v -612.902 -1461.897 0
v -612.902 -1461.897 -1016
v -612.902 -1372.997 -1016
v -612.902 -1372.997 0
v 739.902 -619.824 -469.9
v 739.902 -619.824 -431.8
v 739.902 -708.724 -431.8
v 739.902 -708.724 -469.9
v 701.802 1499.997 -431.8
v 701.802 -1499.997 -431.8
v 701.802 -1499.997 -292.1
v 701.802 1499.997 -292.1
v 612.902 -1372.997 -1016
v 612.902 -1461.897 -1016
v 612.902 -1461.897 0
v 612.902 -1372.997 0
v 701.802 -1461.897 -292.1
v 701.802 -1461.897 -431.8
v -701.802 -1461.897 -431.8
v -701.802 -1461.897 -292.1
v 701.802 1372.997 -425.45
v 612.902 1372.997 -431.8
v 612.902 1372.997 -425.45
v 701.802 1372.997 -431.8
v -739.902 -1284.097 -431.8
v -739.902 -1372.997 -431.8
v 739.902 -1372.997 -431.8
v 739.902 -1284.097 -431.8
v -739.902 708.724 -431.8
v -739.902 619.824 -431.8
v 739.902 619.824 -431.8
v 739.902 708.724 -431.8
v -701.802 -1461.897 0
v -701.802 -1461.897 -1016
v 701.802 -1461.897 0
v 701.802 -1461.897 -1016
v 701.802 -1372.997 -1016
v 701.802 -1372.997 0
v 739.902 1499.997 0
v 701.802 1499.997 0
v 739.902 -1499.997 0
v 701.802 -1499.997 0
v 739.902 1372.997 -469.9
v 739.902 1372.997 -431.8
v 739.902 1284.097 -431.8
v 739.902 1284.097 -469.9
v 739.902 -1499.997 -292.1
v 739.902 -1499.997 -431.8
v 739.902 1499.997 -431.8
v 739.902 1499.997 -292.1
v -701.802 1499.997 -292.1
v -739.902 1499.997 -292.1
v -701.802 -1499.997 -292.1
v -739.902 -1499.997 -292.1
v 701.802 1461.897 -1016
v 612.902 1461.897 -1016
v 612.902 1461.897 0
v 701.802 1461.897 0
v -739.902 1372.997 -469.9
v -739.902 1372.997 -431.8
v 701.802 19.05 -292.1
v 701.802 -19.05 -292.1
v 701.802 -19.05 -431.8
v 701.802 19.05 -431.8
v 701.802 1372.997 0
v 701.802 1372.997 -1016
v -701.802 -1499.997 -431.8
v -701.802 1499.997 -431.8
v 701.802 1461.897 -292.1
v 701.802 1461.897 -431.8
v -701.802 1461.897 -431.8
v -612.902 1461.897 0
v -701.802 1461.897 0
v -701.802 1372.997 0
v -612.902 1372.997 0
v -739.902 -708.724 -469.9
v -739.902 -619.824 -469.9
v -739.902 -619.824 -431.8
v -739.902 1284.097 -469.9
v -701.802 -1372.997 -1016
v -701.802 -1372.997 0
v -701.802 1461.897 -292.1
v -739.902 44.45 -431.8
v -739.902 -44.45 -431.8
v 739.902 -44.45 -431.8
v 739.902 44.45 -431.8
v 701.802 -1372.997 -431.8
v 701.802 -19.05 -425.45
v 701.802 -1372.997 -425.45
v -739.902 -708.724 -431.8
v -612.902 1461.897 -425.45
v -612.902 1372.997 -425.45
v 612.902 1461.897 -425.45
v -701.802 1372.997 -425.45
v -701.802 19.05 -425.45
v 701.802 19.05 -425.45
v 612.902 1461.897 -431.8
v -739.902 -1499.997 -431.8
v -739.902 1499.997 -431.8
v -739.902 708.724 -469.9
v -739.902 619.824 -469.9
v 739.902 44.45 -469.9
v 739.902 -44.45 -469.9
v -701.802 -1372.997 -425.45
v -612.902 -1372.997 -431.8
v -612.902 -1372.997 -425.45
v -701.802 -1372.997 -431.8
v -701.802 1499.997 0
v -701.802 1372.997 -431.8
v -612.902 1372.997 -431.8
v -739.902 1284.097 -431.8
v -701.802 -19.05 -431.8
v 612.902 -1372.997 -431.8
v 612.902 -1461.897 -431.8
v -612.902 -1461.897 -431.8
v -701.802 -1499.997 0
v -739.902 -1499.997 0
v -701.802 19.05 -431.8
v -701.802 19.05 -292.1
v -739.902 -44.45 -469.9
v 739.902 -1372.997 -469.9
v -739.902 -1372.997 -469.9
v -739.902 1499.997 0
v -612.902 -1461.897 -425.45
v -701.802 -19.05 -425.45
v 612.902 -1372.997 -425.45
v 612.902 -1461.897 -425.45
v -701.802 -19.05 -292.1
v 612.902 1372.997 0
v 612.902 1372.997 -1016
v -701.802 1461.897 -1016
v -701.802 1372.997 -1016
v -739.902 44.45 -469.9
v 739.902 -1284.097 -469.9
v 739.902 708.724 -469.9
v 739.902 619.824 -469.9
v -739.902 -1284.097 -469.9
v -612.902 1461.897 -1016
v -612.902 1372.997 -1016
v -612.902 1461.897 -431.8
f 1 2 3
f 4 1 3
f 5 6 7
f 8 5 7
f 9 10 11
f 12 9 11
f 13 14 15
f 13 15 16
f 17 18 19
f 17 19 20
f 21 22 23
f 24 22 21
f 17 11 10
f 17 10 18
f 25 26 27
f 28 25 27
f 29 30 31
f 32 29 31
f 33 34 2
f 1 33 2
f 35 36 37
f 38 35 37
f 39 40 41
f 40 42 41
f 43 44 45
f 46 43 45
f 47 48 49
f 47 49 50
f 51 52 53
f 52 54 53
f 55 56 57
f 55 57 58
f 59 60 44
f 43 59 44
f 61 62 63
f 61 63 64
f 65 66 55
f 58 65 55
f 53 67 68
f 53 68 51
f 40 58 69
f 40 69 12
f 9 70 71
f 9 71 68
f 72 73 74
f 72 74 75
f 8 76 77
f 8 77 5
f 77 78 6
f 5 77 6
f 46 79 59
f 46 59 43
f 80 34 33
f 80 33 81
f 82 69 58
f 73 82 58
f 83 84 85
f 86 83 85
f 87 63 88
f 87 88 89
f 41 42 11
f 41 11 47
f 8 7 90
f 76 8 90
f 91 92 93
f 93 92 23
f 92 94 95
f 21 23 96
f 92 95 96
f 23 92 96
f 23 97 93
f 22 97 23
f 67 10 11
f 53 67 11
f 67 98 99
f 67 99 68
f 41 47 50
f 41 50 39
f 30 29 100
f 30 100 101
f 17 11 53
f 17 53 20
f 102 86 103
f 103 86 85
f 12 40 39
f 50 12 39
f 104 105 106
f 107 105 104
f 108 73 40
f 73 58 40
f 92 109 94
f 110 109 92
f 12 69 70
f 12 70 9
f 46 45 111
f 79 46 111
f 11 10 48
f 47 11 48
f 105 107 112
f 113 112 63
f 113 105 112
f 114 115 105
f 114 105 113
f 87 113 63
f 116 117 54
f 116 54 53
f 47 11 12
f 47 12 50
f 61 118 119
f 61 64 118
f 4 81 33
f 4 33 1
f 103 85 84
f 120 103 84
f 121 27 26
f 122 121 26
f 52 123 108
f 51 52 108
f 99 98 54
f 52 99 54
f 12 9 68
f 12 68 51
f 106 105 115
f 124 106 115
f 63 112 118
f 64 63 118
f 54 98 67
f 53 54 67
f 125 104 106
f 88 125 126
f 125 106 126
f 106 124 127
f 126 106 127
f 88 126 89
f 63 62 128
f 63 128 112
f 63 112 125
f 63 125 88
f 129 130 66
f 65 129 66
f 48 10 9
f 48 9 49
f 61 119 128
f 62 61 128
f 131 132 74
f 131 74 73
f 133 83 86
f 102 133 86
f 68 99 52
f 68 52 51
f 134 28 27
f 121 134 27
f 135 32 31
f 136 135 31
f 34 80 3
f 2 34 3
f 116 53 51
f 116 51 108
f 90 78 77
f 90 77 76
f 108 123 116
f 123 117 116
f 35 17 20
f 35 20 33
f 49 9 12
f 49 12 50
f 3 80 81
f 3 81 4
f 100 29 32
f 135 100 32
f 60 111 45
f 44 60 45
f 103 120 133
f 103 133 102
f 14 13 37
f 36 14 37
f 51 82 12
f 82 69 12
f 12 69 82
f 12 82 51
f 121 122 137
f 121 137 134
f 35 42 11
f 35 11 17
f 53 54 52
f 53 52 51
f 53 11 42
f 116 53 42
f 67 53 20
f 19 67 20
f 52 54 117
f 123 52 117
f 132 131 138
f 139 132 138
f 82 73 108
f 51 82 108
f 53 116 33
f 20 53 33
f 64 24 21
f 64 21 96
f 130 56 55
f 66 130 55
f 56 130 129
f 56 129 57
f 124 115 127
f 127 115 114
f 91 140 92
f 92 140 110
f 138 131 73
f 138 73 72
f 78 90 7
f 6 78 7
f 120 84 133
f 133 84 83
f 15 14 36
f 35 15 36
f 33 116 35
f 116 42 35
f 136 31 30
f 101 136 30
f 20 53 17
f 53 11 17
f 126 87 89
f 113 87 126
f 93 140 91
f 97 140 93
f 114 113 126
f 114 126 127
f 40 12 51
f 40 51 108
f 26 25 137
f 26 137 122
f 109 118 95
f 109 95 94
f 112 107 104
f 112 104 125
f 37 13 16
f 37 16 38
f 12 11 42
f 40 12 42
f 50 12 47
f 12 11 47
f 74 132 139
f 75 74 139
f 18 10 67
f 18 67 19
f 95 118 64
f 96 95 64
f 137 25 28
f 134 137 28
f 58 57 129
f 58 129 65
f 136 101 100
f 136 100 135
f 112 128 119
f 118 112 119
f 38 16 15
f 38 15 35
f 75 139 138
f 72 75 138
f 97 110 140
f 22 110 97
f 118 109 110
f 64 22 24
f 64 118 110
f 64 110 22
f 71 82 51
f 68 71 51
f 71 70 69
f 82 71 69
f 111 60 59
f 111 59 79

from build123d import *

# Parameters (mm, degrees)
F1_W          = 38.1
F1_H          = 292.1
F3_DEPTH      = 1499.997
F3_DEPTH_BACK = 1499.997
F1_H_2        = 139.7
F4_DEPTH      = 1499.997
F4_DEPTH_BACK = 1499.997
F5_W          = 38.1
F5_H          = 292.1
F6_DEPTH      = 701.802
F6_DEPTH_BACK = 701.802
F5_H_2        = 139.7
F7_DEPTH      = 701.802
F7_DEPTH_BACK = 701.802
F8_W          = 88.9
F8_H          = 88.9
F10_DEPTH     = 1016
F12_W         = 1225.804
F12_H         = 88.9
F12_W_2       = 1403.604
F12_H_2       = 575.3735
F12_H_3       = 25.4
F13_DEPTH     = 6.35
F12_W_3       = 38.1
F14_DEPTH     = 38.1
F12_H_4       = 38.1


with BuildPart() as f3:
    # F1 (on Front) → F3 (new body, two sides)
    with BuildSketch(Plane.XZ) as f3_sk:
        with Locations((-720.852, -146.05)):
            Rectangle(F1_W, F1_H)
    extrude(amount=F3_DEPTH)
    extrude(f3_sk.sketch, amount=-F3_DEPTH_BACK)


with BuildPart() as f3b:
    # F1 (on Front) → F3, piece 2 (new body, two sides)
    with BuildSketch(Plane.XZ) as f3_2_sk:
        with Locations((720.852, -146.05)):
            Rectangle(F1_W, F1_H)
    extrude(amount=F3_DEPTH)
    extrude(f3_2_sk.sketch, amount=-F3_DEPTH_BACK)


with BuildPart() as f4:
    # F1 (on Front) → F4 (new body, two sides)
    with BuildSketch(Plane.XZ) as f4_sk:
        with Locations((-720.852, -361.95)):
            Rectangle(F1_W, F1_H_2)
    extrude(amount=F4_DEPTH)
    extrude(f4_sk.sketch, amount=-F4_DEPTH_BACK)


with BuildPart() as f4b:
    # F1 (on Front) → F4, piece 2 (new body, two sides)
    with BuildSketch(Plane.XZ) as f4_2_sk:
        with Locations((720.852, -361.95)):
            Rectangle(F1_W, F1_H_2)
    extrude(amount=F4_DEPTH)
    extrude(f4_2_sk.sketch, amount=-F4_DEPTH_BACK)


with BuildPart() as f6:
    # F5 (on Right) → F6 (new body, two sides)
    with BuildSketch(Plane.YZ) as f6_sk:
        with Locations((1480.947, -146.05)):
            Rectangle(F5_W, F5_H)
    extrude(amount=F6_DEPTH)
    extrude(f6_sk.sketch, amount=-F6_DEPTH_BACK)


with BuildPart() as f6b:
    # F5 (on Right) → F6, piece 2 (new body, two sides)
    with BuildSketch(Plane.YZ) as f6_2_sk:
        with Locations((-1480.947, -146.05)):
            Rectangle(F5_W, F5_H)
    extrude(amount=F6_DEPTH)
    extrude(f6_2_sk.sketch, amount=-F6_DEPTH_BACK)


with BuildPart() as f7:
    # F5 (on Right) → F7 (new body, two sides)
    with BuildSketch(Plane.YZ) as f7_sk:
        with Locations((-1480.947, -361.95)):
            Rectangle(F5_W, F5_H_2)
    extrude(amount=F7_DEPTH)
    extrude(f7_sk.sketch, amount=-F7_DEPTH_BACK)


with BuildPart() as f7b:
    # F5 (on Right) → F7, piece 2 (new body, two sides)
    with BuildSketch(Plane.YZ) as f7_2_sk:
        with Locations((1480.947, -361.95)):
            Rectangle(F5_W, F5_H_2)
    extrude(amount=F7_DEPTH)
    extrude(f7_2_sk.sketch, amount=-F7_DEPTH_BACK)


with BuildPart() as f7c:
    # F5 (on Right) → F7, piece 3 (new body, two sides)
    with BuildSketch(Plane.YZ) as f7_3_sk:
        Polygon((19.05, -292.1), (0, -292.1), (-19.05, -292.1), (-19.05, -431.8), (19.05, -431.8), align=None)
    extrude(amount=F7_DEPTH)
    extrude(f7_3_sk.sketch, amount=-F7_DEPTH_BACK)


with BuildPart() as f10:
    # F8 (on Top) → F10 (new body, through all)
    with BuildSketch(Plane.XY):
        with Locations((-657.352, 1417.447)):
            Rectangle(F8_W, F8_H)
    extrude(amount=-F10_DEPTH)


with BuildPart() as f10b:
    # F8 (on Top) → F10, piece 2 (new body, through all)
    with BuildSketch(Plane.XY):
        with Locations((657.352, 1417.447)):
            Rectangle(F8_W, F8_H)
    extrude(amount=-F10_DEPTH)


with BuildPart() as f10c:
    # F8 (on Top) → F10, piece 3 (new body, through all)
    with BuildSketch(Plane.XY):
        with Locations((-657.352, -1417.447)):
            Rectangle(F8_W, F8_H)
    extrude(amount=-F10_DEPTH)


with BuildPart() as f10d:
    # F8 (on Top) → F10, piece 4 (new body, through all)
    with BuildSketch(Plane.XY):
        with Locations((657.352, -1417.447)):
            Rectangle(F8_W, F8_H)
    extrude(amount=-F10_DEPTH)


with BuildPart() as f13:
    # F12 (on offset) → F13 (new body)
    with BuildSketch(Plane(origin=(0, 0, -431.8), x_dir=(1, 0, 0), z_dir=(0, 0, -1))):
        with Locations((0, 1417.447)):
            Rectangle(F12_W, F12_H)
        Polygon((612.902, 1372.997), (-612.902, 1372.997), (-701.802, 1372.997), (-701.802, 1284.097), (701.802, 1284.097), (701.802, 1372.997), align=None)
        with Locations((0, 996.41025)):
            Rectangle(F12_W_2, F12_H_2)
        with Locations((0, 664.2735)):
            Rectangle(F12_W_2, F12_H)
        with Locations((0, 332.13675)):
            Rectangle(F12_W_2, F12_H_2)
        with Locations((0, 31.75)):
            Rectangle(F12_W_2, F12_H_3)
    extrude(amount=-F13_DEPTH)


with BuildPart() as f13b:
    # F12 (on offset) → F13, piece 2 (new body)
    with BuildSketch(Plane(origin=(0, 0, -431.8), x_dir=(1, 0, 0), z_dir=(0, 0, -1))):
        with Locations((0, -1417.447)):
            Rectangle(F12_W, F12_H)
        with Locations((0, -332.13675)):
            Rectangle(F12_W_2, F12_H_2)
        Polygon((701.802, -1284.097), (-701.802, -1284.097), (-701.802, -1372.997), (-612.902, -1372.997), (612.902, -1372.997), (701.802, -1372.997), align=None)
        with Locations((0, -664.2735)):
            Rectangle(F12_W_2, F12_H)
        with Locations((0, -996.41025)):
            Rectangle(F12_W_2, F12_H_2)
        with Locations((0, -31.75)):
            Rectangle(F12_W_2, F12_H_3)
    extrude(amount=-F13_DEPTH)


with BuildPart() as f14:
    # F12 (on offset) → F14 (new body)
    with BuildSketch(Plane(origin=(0, 0, -431.8), x_dir=(1, 0, 0), z_dir=(0, 0, -1))):
        with Locations((-720.852, 1328.547)):
            Rectangle(F12_W_3, F12_H)
        Polygon((612.902, 1372.997), (-612.902, 1372.997), (-701.802, 1372.997), (-701.802, 1284.097), (701.802, 1284.097), (701.802, 1372.997), align=None)
        with Locations((720.852, 1328.547)):
            Rectangle(F12_W_3, F12_H)
    extrude(amount=F14_DEPTH)


with BuildPart() as f14b:
    # F12 (on offset) → F14, piece 2 (new body)
    with BuildSketch(Plane(origin=(0, 0, -431.8), x_dir=(1, 0, 0), z_dir=(0, 0, -1))):
        with Locations((-720.852, 664.2735)):
            Rectangle(F12_W_3, F12_H)
        with Locations((0, 664.2735)):
            Rectangle(F12_W_2, F12_H)
        with Locations((720.852, 664.2735)):
            Rectangle(F12_W_3, F12_H)
    extrude(amount=F14_DEPTH)


with BuildPart() as f14c:
    # F12 (on offset) → F14, piece 3 (new body)
    with BuildSketch(Plane(origin=(0, 0, -431.8), x_dir=(1, 0, 0), z_dir=(0, 0, -1))):
        with Locations((0, 31.75)):
            Rectangle(F12_W_2, F12_H_3)
        Rectangle(F12_W_2, F12_H_4)
        Polygon((-701.802, 19.05), (-701.802, 44.45), (-739.902, 44.45), (-739.902, -44.45), (-701.802, -44.45), (-701.802, -19.05), align=None)
        with Locations((0, -31.75)):
            Rectangle(F12_W_2, F12_H_3)
        Polygon((739.902, 44.45), (701.802, 44.45), (701.802, 19.05), (701.802, -19.05), (701.802, -44.45), (739.902, -44.45), align=None)
    extrude(amount=F14_DEPTH)


with BuildPart() as f14d:
    # F12 (on offset) → F14, piece 4 (new body)
    with BuildSketch(Plane(origin=(0, 0, -431.8), x_dir=(1, 0, 0), z_dir=(0, 0, -1))):
        with Locations((-720.852, -664.2735)):
            Rectangle(F12_W_3, F12_H)
        with Locations((0, -664.2735)):
            Rectangle(F12_W_2, F12_H)
        with Locations((720.852, -664.2735)):
            Rectangle(F12_W_3, F12_H)
    extrude(amount=F14_DEPTH)


with BuildPart() as f14e:
    # F12 (on offset) → F14, piece 5 (new body)
    with BuildSketch(Plane(origin=(0, 0, -431.8), x_dir=(1, 0, 0), z_dir=(0, 0, -1))):
        with Locations((720.852, -1328.547)):
            Rectangle(F12_W_3, F12_H)
        with Locations((-720.852, -1328.547)):
            Rectangle(F12_W_3, F12_H)
        Polygon((701.802, -1284.097), (-701.802, -1284.097), (-701.802, -1372.997), (-612.902, -1372.997), (612.902, -1372.997), (701.802, -1372.997), align=None)
    extrude(amount=F14_DEPTH)


solid = Compound([f3.part, f3b.part, f4.part, f4b.part, f6.part, f6b.part, f7.part, f7b.part, f7c.part, f10.part, f10b.part, f10c.part, f10d.part, f13.part, f13b.part, f14.part, f14b.part, f14c.part, f14d.part, f14e.part])
